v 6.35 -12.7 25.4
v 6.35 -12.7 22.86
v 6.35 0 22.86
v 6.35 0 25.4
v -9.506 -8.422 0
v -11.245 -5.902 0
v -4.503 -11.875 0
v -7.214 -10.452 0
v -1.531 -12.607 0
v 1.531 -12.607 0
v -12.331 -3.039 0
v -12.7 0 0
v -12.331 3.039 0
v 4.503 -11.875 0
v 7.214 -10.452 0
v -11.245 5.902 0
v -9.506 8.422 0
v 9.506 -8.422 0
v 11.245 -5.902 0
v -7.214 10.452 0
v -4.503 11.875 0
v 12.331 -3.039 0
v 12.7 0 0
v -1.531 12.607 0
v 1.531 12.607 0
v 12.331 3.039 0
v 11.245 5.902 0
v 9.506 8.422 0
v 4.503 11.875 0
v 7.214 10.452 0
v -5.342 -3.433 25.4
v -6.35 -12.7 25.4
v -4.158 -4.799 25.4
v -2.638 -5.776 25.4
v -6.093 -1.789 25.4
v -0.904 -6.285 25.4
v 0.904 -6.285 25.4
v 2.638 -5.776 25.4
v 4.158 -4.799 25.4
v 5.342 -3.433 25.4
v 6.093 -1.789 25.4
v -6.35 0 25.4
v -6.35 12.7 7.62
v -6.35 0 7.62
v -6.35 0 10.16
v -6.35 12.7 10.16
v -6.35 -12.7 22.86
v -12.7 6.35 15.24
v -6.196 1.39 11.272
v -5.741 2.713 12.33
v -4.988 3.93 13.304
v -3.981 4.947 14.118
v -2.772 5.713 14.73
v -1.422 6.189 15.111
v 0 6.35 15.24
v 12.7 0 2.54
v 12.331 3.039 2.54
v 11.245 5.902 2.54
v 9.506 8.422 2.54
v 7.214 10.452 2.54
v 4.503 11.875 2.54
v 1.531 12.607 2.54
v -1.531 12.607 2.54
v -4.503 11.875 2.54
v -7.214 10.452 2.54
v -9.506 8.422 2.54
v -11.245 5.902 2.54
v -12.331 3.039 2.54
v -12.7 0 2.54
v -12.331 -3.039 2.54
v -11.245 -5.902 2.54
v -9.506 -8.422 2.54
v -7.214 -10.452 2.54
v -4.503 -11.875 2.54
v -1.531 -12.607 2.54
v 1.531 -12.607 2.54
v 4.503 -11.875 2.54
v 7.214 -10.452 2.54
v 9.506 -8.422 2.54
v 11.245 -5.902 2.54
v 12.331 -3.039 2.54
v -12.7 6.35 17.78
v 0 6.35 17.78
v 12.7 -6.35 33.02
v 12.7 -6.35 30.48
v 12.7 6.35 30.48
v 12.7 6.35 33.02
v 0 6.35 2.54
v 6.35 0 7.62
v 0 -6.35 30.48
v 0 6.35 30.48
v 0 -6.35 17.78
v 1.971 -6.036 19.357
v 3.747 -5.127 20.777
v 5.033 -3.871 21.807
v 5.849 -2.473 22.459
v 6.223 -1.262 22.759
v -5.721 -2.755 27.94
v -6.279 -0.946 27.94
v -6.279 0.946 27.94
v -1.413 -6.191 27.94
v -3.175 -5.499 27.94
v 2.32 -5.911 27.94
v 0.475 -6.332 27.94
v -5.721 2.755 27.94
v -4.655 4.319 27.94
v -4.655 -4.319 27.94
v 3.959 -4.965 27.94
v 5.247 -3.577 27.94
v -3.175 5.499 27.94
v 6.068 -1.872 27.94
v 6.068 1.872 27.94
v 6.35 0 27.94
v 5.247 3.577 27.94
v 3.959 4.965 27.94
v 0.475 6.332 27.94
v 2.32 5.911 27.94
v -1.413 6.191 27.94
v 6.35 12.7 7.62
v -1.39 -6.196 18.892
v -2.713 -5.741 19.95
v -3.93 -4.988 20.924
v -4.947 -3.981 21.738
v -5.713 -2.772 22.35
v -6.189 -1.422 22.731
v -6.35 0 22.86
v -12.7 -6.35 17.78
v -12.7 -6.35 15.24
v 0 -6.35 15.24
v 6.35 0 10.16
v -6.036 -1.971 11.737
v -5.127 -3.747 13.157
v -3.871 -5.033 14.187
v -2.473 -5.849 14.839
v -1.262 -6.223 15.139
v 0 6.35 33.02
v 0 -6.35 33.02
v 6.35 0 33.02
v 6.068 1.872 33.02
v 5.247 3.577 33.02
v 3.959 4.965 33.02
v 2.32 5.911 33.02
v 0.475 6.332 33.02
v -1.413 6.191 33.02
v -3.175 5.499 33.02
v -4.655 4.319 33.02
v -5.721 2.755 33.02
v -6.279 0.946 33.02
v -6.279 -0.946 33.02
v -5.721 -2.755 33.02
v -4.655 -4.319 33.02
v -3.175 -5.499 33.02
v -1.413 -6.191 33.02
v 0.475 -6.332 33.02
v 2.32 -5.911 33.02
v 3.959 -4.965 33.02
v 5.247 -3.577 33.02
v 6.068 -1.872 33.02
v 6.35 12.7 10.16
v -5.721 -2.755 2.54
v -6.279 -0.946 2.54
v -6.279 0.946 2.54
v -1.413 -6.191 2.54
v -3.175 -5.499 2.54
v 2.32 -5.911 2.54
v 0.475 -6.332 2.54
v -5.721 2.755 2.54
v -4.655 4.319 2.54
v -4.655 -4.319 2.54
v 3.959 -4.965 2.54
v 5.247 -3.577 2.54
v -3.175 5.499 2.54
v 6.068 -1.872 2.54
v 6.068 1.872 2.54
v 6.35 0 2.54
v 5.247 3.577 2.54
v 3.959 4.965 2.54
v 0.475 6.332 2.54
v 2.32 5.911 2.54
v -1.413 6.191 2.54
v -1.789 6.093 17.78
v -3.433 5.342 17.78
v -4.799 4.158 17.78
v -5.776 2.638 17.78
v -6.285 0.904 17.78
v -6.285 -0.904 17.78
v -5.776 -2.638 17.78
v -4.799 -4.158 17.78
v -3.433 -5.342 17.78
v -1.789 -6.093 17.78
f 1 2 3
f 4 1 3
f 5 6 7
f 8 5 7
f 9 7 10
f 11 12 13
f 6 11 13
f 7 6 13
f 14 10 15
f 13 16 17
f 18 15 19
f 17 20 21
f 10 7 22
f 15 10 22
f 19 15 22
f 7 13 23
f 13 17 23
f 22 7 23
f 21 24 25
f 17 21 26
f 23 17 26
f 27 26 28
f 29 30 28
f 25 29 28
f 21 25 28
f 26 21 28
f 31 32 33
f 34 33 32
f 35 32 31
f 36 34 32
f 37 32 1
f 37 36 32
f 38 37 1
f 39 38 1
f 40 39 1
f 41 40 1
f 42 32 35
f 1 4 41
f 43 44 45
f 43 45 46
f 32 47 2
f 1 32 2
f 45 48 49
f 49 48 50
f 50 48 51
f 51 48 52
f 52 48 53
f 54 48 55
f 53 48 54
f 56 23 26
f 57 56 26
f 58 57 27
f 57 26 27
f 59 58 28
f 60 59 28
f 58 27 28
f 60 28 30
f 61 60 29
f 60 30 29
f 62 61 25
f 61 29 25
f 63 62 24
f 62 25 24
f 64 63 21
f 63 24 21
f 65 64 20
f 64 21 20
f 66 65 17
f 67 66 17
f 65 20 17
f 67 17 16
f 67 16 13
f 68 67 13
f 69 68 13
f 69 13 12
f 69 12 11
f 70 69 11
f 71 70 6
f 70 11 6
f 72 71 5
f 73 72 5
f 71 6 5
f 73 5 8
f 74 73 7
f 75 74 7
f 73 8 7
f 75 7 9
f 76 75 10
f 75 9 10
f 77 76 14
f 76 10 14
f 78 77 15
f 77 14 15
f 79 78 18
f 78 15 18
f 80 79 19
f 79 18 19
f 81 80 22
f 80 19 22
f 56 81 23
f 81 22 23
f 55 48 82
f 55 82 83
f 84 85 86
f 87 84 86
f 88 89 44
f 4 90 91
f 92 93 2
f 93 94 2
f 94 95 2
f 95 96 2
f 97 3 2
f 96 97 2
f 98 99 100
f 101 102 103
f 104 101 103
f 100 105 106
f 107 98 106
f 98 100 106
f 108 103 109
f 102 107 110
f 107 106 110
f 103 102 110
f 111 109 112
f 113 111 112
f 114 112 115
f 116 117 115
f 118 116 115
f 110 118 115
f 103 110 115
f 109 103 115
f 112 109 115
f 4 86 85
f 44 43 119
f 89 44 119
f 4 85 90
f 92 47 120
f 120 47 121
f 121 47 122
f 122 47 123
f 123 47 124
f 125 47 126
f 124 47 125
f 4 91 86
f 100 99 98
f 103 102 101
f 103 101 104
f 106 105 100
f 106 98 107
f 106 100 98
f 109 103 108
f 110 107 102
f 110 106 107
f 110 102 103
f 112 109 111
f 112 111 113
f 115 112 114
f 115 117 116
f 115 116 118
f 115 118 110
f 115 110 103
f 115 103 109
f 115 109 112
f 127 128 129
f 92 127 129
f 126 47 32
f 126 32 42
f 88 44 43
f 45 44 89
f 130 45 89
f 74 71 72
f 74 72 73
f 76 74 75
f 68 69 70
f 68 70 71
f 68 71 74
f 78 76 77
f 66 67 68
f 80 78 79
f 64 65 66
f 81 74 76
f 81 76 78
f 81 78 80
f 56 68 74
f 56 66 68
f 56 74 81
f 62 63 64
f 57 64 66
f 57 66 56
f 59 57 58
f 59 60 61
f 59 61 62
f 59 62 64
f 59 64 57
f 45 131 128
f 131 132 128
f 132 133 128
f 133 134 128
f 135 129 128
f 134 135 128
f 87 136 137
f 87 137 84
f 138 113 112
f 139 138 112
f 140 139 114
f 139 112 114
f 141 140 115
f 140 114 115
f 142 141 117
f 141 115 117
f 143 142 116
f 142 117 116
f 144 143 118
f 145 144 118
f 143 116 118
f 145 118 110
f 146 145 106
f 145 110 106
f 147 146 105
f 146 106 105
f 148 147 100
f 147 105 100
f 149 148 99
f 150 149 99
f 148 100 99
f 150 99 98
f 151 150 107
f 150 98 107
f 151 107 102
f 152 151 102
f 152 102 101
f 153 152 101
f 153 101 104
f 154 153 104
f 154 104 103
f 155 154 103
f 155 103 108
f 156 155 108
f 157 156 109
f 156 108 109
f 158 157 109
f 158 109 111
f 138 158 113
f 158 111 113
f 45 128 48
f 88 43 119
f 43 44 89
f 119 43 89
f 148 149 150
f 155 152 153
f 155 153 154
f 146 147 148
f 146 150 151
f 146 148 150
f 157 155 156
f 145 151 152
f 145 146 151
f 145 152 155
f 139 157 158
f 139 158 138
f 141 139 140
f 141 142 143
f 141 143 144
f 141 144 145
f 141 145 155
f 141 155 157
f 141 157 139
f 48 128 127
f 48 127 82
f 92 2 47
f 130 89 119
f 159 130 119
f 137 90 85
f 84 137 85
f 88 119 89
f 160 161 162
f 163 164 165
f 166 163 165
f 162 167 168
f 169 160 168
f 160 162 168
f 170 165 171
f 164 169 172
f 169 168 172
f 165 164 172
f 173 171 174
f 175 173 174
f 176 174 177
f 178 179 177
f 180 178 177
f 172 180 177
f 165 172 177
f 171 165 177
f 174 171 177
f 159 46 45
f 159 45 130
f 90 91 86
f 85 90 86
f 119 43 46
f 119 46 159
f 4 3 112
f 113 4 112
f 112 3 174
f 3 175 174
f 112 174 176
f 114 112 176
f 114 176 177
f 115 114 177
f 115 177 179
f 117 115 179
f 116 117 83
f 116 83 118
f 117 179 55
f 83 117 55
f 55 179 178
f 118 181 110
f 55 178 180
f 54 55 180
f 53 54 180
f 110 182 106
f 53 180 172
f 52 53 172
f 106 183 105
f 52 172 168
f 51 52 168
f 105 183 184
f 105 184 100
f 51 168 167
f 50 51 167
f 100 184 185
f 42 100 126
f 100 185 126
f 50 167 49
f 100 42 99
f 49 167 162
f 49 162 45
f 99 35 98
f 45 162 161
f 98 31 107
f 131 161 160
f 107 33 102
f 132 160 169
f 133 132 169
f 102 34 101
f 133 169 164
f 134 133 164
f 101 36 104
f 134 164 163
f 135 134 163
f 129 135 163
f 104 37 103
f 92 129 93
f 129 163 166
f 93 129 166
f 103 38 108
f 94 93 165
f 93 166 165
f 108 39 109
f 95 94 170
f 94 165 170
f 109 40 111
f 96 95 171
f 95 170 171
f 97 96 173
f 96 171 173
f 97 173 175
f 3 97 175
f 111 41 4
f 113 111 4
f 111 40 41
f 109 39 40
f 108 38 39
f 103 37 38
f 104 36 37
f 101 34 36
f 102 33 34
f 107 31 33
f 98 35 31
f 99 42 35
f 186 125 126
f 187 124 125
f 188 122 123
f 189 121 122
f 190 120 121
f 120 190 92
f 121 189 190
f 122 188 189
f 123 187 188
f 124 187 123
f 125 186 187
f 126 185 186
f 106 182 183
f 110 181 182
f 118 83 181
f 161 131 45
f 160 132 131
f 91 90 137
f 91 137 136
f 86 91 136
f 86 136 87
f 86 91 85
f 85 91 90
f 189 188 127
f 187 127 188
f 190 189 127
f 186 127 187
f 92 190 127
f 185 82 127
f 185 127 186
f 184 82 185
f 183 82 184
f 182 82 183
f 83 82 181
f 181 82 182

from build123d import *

# Parameters (mm, degrees)
F0_R       = 12.7
F1_DEPTH   = 2.54
F4_W       = 12.7
F4_H       = 12.7
F5_DEPTH   = 2.54
F6_R       = 6.35
F7_DEPTH   = 25.4
F9_W       = 12.7
F9_H       = 12.7
F10_DEPTH  = 2.54
F5_FACE1_W = 12.7
F5_FACE1_H = 12.7
F16_W      = 12.7
F16_H      = 12.7
F17_DEPTH  = 2.54
F21_W      = 12.7
F21_H      = 12.7
F22_DEPTH  = 2.54
F23_R      = 6.35
F24_DEPTH  = 5.08
F22_FACE_W = 12.7
F22_FACE_H = 12.7


with BuildPart() as f1:
    # F0 (on Top) → F1 (new body)
    with BuildSketch(Plane.XY):
        Circle(F0_R)
    extrude(amount=F1_DEPTH)


with BuildPart() as f5:
    # F4 (on offset) → F5 (new body)
    with BuildSketch(Plane.XY.offset(7.62)):
        with Locations((0, 6.35)):
            Rectangle(F4_W, F4_H)
    extrude(amount=F5_DEPTH)


with BuildPart() as f7:
    # F6 (on face) → F7 (new body)
    with BuildSketch(Plane.XY.offset(2.54)):
        Circle(F6_R)
    extrude(amount=F7_DEPTH)

    # F9 (on offset) → F10 (join)
    with BuildSketch(Plane.XY.offset(15.24)):
        with Locations((-6.35, 0)):
            Rectangle(F9_W, F9_H)
    extrude(amount=F10_DEPTH)

    # F10_face (on face) → F12 section 0
    with BuildSketch(Plane(origin=(-8.7134178579, 0, 15.24), x_dir=(1, 0, 0), z_dir=(0, 0, -1)), mode=Mode.PRIVATE) as f12_s0:
        with BuildLine():
            Line((8.7134178579, 6.35), (-3.9865821421, 6.35))
            Line((-3.9865821421, 6.35), (-3.9865821421, -6.35))
            Line((-3.9865821421, -6.35), (8.7134178579, -6.35))
            ThreePointArc((8.7134178579, -6.35), (2.3634178579, 0), (8.7134178579, 6.35))
        make_face()
    loft([Vertex(-6.35, 0, 10.16), f12_s0.sketch])

    # F16 (on offset) → F17 (join)
    with BuildSketch(Plane.XY.offset(22.86)):
        with Locations((0, -6.35)):
            Rectangle(F16_W, F16_H)
    extrude(amount=F17_DEPTH)

    # F17_face (on face) → F19 section 0
    with BuildSketch(Plane(origin=(0, -8.7134178579, 22.86), x_dir=(1, 0, 0), z_dir=(0, 0, -1)), mode=Mode.PRIVATE) as f19_s0:
        with BuildLine():
            Line((-6.35, 3.9865821421), (-6.35, -8.7134178579))
            ThreePointArc((-6.35, -8.7134178579), (0, -2.3634178579), (6.35, -8.7134178579))
            Line((6.35, -8.7134178579), (6.35, 3.9865821421))
            Line((6.35, 3.9865821421), (-6.35, 3.9865821421))
        make_face()
    loft([Vertex(0, -6.35, 17.78), f19_s0.sketch])


with BuildPart() as f14:
    # F5_face1 (on face) → F14 section 0
    with BuildSketch(Plane(origin=(0, 6.35, 7.62), x_dir=(1, 0, 0), z_dir=(0, 0, -1)), mode=Mode.PRIVATE) as f14_s0:
        Rectangle(F5_FACE1_W, F5_FACE1_H)
    loft([Vertex(0, 6.35, 2.54), f14_s0.sketch])


with BuildPart() as f22:
    # F21 (on offset) → F22 (new body)
    with BuildSketch(Plane.XY.offset(30.48)):
        with Locations((6.35, 0)):
            Rectangle(F21_W, F21_H)
    extrude(amount=F22_DEPTH)


with BuildPart() as f24:
    # F23 (on face) → F24 (new body, through all)
    with BuildSketch(Plane.XY.offset(27.94)):
        Circle(F23_R)
    extrude(amount=F24_DEPTH)


with BuildPart() as f26:
    # F22_face (on face) → F26 section 0
    with BuildSketch(Plane(origin=(6.35, 0, 30.48), x_dir=(1, 0, 0), z_dir=(0, 0, -1)), mode=Mode.PRIVATE) as f26_s0:
        Rectangle(F22_FACE_W, F22_FACE_H)
    loft([Vertex(6.35, 0, 25.4), f26_s0.sketch])


solid = Compound([f1.part, f5.part, f7.part, f14.part, f22.part, f24.part, f26.part])
